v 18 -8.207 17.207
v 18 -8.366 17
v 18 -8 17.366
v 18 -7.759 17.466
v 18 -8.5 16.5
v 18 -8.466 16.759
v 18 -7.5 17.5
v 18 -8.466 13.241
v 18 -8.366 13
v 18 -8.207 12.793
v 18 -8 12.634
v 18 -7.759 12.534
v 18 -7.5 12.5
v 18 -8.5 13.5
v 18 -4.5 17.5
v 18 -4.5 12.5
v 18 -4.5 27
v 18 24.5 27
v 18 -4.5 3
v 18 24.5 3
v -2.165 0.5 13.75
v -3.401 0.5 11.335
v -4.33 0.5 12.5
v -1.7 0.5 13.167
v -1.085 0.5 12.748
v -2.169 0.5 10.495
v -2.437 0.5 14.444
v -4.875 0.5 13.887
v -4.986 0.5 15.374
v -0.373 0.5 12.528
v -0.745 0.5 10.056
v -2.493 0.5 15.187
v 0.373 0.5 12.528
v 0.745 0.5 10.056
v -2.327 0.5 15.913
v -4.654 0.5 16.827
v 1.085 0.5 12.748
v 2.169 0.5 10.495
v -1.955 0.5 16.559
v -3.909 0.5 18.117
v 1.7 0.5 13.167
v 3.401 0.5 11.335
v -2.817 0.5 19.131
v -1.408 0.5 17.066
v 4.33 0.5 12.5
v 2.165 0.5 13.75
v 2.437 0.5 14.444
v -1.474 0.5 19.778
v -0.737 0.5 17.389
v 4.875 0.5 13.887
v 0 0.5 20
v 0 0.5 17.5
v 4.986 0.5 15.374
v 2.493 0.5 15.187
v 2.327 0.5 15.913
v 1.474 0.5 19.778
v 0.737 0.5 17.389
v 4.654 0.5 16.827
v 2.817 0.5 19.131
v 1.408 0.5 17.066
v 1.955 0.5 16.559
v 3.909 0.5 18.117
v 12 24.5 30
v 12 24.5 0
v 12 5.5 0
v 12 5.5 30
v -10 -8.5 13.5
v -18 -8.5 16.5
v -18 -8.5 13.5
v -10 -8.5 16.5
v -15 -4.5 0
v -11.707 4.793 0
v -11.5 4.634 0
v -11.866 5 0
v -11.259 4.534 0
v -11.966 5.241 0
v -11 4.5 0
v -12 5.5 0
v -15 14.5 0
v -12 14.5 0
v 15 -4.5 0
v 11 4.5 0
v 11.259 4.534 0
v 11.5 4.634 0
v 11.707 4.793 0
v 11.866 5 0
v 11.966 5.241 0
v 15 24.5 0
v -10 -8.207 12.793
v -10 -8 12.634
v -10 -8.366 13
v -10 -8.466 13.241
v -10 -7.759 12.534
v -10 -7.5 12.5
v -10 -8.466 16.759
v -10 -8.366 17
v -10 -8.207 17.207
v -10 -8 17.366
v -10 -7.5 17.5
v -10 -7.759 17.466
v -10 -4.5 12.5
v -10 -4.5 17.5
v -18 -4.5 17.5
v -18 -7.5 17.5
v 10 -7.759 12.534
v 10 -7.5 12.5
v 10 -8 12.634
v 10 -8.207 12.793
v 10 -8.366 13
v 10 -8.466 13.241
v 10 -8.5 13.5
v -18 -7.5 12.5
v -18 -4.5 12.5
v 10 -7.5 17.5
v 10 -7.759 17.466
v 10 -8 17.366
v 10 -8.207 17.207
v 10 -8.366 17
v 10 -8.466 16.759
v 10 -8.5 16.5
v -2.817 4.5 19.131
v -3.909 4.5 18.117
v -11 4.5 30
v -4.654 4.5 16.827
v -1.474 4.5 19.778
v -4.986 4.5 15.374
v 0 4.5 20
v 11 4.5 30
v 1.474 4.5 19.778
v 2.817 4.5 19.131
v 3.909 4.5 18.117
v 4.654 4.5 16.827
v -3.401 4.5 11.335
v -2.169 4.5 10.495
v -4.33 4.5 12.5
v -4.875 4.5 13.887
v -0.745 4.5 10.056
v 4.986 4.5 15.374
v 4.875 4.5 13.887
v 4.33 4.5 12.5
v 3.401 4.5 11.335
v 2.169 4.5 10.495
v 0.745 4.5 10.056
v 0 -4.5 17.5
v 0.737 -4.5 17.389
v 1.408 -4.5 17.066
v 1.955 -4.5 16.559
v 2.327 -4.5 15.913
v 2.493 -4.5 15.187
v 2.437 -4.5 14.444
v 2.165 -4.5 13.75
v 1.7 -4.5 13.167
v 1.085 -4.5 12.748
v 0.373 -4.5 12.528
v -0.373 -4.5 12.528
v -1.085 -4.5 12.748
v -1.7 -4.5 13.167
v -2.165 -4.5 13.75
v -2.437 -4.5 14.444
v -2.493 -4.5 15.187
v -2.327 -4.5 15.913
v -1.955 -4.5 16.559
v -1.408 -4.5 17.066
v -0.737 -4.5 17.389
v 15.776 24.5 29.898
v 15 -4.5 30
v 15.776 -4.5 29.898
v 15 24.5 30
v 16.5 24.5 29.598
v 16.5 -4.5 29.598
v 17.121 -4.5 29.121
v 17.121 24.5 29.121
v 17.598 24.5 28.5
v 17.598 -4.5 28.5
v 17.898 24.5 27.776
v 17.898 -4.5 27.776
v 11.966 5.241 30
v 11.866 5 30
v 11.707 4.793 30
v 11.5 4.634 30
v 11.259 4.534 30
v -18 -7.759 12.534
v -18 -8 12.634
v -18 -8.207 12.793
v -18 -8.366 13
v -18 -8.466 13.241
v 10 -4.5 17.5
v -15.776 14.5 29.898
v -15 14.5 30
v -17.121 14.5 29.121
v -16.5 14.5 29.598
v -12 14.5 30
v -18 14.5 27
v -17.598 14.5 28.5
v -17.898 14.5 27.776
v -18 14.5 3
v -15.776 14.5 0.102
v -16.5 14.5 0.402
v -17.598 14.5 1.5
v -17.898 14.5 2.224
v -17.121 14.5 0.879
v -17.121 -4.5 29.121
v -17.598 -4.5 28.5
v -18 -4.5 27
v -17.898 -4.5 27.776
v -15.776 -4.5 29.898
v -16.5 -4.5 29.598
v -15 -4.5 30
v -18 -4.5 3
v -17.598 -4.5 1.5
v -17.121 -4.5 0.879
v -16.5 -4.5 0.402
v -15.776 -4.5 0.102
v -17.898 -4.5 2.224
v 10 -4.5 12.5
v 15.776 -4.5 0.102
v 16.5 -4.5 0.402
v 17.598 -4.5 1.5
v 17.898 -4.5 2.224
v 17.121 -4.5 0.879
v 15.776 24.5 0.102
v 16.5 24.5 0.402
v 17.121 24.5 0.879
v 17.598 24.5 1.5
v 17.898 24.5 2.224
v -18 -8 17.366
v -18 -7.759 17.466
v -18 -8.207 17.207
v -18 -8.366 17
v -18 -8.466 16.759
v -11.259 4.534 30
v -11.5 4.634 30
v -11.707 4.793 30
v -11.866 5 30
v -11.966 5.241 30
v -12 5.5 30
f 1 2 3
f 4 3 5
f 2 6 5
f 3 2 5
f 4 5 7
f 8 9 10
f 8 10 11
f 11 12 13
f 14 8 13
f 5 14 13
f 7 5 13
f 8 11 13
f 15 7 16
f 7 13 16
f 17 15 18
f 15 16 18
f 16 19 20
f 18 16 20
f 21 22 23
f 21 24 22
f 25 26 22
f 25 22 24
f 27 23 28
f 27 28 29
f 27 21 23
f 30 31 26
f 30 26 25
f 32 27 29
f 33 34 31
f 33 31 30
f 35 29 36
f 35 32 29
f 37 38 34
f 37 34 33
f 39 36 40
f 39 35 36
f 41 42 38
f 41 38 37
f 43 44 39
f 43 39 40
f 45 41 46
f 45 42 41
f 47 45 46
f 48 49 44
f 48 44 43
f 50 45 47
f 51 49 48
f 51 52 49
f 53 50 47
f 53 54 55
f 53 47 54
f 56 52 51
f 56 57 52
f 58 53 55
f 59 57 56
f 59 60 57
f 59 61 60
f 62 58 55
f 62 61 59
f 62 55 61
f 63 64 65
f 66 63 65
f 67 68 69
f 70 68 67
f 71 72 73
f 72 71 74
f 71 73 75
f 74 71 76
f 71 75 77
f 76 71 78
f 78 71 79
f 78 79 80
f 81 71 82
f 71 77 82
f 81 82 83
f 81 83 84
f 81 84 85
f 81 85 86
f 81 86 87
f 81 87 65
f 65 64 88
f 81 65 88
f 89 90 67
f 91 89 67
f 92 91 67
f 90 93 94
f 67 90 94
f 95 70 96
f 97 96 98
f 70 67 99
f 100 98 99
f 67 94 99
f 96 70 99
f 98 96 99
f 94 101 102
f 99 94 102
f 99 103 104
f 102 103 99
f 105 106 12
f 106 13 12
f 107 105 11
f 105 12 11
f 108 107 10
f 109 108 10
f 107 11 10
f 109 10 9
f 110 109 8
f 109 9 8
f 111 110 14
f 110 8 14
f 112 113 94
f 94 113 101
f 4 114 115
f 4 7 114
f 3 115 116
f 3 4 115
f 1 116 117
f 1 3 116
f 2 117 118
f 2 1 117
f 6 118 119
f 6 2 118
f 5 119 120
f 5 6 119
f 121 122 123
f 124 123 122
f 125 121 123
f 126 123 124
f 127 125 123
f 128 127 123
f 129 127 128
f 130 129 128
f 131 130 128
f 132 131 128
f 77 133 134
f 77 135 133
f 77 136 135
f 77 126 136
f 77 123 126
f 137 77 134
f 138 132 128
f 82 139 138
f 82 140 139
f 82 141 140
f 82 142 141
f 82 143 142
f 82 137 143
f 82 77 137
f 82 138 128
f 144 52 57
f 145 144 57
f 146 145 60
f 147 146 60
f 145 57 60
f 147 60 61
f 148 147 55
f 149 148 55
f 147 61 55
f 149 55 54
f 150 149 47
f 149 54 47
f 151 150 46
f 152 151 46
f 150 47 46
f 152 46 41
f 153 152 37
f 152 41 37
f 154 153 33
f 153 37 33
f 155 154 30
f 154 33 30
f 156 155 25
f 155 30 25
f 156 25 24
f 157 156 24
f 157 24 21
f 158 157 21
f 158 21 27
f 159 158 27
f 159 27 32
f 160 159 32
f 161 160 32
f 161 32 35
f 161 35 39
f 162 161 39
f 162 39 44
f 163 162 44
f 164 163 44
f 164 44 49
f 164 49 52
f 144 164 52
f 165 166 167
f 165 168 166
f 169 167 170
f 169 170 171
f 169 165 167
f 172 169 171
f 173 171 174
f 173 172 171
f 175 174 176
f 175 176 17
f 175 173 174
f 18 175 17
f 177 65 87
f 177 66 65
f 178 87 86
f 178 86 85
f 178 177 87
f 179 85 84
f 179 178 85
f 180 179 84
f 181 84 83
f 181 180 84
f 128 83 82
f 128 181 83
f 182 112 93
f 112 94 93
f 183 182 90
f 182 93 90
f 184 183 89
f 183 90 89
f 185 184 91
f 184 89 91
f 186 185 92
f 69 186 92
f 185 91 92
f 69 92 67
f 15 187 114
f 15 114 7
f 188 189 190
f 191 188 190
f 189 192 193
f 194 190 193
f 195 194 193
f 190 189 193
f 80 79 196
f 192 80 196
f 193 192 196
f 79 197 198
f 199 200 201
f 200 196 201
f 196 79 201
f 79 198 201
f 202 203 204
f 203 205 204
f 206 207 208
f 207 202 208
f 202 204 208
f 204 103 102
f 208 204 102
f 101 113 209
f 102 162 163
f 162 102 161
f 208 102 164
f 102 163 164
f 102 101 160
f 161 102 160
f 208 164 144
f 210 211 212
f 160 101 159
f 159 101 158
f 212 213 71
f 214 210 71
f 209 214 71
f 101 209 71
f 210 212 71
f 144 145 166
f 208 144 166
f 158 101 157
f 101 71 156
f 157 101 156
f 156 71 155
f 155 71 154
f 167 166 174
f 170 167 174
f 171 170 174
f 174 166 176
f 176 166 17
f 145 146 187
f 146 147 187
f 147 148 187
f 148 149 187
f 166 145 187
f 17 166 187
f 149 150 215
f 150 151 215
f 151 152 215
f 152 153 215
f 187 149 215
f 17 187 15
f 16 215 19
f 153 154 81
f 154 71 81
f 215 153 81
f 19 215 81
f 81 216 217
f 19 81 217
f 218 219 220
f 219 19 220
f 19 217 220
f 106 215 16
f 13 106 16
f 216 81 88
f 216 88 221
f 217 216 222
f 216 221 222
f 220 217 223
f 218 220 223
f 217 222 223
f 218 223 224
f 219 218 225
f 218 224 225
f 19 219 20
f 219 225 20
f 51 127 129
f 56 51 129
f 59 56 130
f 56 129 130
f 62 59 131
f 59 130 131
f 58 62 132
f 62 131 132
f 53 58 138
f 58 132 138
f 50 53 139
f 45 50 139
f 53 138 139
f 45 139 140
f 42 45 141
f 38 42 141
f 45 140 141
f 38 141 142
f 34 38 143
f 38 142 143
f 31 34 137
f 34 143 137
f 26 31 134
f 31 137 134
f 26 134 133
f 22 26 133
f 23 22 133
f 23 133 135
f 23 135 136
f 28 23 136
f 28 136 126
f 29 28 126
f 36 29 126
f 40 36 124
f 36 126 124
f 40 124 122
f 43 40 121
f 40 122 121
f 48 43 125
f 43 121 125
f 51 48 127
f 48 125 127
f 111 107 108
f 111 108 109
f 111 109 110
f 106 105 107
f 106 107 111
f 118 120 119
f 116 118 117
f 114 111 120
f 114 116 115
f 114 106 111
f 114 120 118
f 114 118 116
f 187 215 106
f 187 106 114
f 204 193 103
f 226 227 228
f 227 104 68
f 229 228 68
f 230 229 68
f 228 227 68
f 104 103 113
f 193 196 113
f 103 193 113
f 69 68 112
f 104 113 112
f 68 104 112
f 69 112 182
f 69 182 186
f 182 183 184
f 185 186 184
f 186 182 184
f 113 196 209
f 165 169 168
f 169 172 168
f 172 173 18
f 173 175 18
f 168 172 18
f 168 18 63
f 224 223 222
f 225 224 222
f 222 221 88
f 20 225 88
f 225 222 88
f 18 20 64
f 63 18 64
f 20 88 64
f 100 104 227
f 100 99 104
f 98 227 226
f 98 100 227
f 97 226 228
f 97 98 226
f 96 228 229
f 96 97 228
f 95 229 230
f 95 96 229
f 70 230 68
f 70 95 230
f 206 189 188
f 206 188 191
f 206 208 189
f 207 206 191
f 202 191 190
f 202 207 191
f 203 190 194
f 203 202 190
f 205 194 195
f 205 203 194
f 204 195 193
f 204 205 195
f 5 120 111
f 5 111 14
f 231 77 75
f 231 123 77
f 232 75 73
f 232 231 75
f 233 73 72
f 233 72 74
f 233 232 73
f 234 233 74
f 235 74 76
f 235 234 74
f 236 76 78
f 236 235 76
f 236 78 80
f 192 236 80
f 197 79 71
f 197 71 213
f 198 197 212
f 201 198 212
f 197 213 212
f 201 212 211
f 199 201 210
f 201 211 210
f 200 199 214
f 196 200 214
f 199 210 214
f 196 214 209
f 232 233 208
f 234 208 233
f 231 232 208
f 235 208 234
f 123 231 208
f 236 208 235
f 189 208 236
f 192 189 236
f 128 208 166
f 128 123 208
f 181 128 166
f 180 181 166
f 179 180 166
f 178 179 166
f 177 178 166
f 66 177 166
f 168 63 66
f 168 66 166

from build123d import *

# Parameters (mm, degrees)
SKETCH1_W           = 24
SKETCH1_H           = 9
BOSS_EXTRUDE1_DEPTH = 30
FILLET1_R           = 1
FILLET2_R           = 3
SKETCH3_R           = 2.5
CUT_EXTRUDE2_DEPTH  = 10
SKETCH4_R           = 5
CUT_EXTRUDE3_DEPTH  = 4
SKETCH5_W           = 8
SKETCH5_H           = 5
BOSS_EXTRUDE2_DEPTH = 4
FILLET3_R           = 1


with BuildPart() as part:
    # Sketch1 → Boss-Extrude1 (new body)
    with BuildSketch(Plane.XY):
        Polygon((-18, -4.5), (-12, -4.5), (-12, 4.5), (-12, 14.5), (-18, 14.5), align=None)
        Rectangle(SKETCH1_W, SKETCH1_H)
        Polygon((12, 4.5), (12, -4.5), (18, -4.5), (18, 24.5), (12, 24.5), align=None)
    extrude(amount=BOSS_EXTRUDE1_DEPTH)

    # Fillet1
    fillet1_edges = [part.edges().sort_by_distance(p)[0] for p in [
        (-12, 4.5, 15),
        (12, 4.5, 15),
    ]]
    fillet(fillet1_edges, radius=FILLET1_R)

    # Fillet2
    fillet2_edges = [part.edges().sort_by_distance(p)[0] for p in [
        (18, 10, 0),
        (-18, 5, 0),
        (18, 10, 30),
        (-18, 5, 30),
    ]]
    fillet(fillet2_edges, radius=FILLET2_R)

    # Sketch3 → Cut-Extrude2 (cut)
    with BuildSketch(Plane(origin=(0, 4.5, 0), x_dir=(1, 0, 0), z_dir=(0, 1, 0))):
        with Locations(Location((0, -15, 0), (0, 0, 270))):
            Circle(SKETCH3_R)
    extrude(amount=-CUT_EXTRUDE2_DEPTH, mode=Mode.SUBTRACT)

    # Sketch4 → Cut-Extrude3 (cut)
    with BuildSketch(Plane(origin=(0, 4.5, 0), x_dir=(1, 0, 0), z_dir=(0, 1, 0))):
        with Locations(Location((0, -15, 0), (0, 0, 270))):
            Circle(SKETCH4_R)
    extrude(amount=-CUT_EXTRUDE3_DEPTH, mode=Mode.SUBTRACT)

    # Sketch5 → Boss-Extrude2 (add)
    with BuildSketch(Plane.XZ.offset(4.5)):
        with Locations((-14, 15)):
            Rectangle(SKETCH5_W, SKETCH5_H)
        with Locations((14, 15)):
            Rectangle(SKETCH5_W, SKETCH5_H)
    extrude(amount=BOSS_EXTRUDE2_DEPTH)

    # Fillet3
    fillet3_edges = [part.edges().sort_by_distance(p)[0] for p in [
        (14, -8.5, 17.5),
        (14, -8.5, 12.5),
        (-14, -8.5, 12.5),
        (-14, -8.5, 17.5),
    ]]
    fillet(fillet3_edges, radius=FILLET3_R)


solid = part.part
